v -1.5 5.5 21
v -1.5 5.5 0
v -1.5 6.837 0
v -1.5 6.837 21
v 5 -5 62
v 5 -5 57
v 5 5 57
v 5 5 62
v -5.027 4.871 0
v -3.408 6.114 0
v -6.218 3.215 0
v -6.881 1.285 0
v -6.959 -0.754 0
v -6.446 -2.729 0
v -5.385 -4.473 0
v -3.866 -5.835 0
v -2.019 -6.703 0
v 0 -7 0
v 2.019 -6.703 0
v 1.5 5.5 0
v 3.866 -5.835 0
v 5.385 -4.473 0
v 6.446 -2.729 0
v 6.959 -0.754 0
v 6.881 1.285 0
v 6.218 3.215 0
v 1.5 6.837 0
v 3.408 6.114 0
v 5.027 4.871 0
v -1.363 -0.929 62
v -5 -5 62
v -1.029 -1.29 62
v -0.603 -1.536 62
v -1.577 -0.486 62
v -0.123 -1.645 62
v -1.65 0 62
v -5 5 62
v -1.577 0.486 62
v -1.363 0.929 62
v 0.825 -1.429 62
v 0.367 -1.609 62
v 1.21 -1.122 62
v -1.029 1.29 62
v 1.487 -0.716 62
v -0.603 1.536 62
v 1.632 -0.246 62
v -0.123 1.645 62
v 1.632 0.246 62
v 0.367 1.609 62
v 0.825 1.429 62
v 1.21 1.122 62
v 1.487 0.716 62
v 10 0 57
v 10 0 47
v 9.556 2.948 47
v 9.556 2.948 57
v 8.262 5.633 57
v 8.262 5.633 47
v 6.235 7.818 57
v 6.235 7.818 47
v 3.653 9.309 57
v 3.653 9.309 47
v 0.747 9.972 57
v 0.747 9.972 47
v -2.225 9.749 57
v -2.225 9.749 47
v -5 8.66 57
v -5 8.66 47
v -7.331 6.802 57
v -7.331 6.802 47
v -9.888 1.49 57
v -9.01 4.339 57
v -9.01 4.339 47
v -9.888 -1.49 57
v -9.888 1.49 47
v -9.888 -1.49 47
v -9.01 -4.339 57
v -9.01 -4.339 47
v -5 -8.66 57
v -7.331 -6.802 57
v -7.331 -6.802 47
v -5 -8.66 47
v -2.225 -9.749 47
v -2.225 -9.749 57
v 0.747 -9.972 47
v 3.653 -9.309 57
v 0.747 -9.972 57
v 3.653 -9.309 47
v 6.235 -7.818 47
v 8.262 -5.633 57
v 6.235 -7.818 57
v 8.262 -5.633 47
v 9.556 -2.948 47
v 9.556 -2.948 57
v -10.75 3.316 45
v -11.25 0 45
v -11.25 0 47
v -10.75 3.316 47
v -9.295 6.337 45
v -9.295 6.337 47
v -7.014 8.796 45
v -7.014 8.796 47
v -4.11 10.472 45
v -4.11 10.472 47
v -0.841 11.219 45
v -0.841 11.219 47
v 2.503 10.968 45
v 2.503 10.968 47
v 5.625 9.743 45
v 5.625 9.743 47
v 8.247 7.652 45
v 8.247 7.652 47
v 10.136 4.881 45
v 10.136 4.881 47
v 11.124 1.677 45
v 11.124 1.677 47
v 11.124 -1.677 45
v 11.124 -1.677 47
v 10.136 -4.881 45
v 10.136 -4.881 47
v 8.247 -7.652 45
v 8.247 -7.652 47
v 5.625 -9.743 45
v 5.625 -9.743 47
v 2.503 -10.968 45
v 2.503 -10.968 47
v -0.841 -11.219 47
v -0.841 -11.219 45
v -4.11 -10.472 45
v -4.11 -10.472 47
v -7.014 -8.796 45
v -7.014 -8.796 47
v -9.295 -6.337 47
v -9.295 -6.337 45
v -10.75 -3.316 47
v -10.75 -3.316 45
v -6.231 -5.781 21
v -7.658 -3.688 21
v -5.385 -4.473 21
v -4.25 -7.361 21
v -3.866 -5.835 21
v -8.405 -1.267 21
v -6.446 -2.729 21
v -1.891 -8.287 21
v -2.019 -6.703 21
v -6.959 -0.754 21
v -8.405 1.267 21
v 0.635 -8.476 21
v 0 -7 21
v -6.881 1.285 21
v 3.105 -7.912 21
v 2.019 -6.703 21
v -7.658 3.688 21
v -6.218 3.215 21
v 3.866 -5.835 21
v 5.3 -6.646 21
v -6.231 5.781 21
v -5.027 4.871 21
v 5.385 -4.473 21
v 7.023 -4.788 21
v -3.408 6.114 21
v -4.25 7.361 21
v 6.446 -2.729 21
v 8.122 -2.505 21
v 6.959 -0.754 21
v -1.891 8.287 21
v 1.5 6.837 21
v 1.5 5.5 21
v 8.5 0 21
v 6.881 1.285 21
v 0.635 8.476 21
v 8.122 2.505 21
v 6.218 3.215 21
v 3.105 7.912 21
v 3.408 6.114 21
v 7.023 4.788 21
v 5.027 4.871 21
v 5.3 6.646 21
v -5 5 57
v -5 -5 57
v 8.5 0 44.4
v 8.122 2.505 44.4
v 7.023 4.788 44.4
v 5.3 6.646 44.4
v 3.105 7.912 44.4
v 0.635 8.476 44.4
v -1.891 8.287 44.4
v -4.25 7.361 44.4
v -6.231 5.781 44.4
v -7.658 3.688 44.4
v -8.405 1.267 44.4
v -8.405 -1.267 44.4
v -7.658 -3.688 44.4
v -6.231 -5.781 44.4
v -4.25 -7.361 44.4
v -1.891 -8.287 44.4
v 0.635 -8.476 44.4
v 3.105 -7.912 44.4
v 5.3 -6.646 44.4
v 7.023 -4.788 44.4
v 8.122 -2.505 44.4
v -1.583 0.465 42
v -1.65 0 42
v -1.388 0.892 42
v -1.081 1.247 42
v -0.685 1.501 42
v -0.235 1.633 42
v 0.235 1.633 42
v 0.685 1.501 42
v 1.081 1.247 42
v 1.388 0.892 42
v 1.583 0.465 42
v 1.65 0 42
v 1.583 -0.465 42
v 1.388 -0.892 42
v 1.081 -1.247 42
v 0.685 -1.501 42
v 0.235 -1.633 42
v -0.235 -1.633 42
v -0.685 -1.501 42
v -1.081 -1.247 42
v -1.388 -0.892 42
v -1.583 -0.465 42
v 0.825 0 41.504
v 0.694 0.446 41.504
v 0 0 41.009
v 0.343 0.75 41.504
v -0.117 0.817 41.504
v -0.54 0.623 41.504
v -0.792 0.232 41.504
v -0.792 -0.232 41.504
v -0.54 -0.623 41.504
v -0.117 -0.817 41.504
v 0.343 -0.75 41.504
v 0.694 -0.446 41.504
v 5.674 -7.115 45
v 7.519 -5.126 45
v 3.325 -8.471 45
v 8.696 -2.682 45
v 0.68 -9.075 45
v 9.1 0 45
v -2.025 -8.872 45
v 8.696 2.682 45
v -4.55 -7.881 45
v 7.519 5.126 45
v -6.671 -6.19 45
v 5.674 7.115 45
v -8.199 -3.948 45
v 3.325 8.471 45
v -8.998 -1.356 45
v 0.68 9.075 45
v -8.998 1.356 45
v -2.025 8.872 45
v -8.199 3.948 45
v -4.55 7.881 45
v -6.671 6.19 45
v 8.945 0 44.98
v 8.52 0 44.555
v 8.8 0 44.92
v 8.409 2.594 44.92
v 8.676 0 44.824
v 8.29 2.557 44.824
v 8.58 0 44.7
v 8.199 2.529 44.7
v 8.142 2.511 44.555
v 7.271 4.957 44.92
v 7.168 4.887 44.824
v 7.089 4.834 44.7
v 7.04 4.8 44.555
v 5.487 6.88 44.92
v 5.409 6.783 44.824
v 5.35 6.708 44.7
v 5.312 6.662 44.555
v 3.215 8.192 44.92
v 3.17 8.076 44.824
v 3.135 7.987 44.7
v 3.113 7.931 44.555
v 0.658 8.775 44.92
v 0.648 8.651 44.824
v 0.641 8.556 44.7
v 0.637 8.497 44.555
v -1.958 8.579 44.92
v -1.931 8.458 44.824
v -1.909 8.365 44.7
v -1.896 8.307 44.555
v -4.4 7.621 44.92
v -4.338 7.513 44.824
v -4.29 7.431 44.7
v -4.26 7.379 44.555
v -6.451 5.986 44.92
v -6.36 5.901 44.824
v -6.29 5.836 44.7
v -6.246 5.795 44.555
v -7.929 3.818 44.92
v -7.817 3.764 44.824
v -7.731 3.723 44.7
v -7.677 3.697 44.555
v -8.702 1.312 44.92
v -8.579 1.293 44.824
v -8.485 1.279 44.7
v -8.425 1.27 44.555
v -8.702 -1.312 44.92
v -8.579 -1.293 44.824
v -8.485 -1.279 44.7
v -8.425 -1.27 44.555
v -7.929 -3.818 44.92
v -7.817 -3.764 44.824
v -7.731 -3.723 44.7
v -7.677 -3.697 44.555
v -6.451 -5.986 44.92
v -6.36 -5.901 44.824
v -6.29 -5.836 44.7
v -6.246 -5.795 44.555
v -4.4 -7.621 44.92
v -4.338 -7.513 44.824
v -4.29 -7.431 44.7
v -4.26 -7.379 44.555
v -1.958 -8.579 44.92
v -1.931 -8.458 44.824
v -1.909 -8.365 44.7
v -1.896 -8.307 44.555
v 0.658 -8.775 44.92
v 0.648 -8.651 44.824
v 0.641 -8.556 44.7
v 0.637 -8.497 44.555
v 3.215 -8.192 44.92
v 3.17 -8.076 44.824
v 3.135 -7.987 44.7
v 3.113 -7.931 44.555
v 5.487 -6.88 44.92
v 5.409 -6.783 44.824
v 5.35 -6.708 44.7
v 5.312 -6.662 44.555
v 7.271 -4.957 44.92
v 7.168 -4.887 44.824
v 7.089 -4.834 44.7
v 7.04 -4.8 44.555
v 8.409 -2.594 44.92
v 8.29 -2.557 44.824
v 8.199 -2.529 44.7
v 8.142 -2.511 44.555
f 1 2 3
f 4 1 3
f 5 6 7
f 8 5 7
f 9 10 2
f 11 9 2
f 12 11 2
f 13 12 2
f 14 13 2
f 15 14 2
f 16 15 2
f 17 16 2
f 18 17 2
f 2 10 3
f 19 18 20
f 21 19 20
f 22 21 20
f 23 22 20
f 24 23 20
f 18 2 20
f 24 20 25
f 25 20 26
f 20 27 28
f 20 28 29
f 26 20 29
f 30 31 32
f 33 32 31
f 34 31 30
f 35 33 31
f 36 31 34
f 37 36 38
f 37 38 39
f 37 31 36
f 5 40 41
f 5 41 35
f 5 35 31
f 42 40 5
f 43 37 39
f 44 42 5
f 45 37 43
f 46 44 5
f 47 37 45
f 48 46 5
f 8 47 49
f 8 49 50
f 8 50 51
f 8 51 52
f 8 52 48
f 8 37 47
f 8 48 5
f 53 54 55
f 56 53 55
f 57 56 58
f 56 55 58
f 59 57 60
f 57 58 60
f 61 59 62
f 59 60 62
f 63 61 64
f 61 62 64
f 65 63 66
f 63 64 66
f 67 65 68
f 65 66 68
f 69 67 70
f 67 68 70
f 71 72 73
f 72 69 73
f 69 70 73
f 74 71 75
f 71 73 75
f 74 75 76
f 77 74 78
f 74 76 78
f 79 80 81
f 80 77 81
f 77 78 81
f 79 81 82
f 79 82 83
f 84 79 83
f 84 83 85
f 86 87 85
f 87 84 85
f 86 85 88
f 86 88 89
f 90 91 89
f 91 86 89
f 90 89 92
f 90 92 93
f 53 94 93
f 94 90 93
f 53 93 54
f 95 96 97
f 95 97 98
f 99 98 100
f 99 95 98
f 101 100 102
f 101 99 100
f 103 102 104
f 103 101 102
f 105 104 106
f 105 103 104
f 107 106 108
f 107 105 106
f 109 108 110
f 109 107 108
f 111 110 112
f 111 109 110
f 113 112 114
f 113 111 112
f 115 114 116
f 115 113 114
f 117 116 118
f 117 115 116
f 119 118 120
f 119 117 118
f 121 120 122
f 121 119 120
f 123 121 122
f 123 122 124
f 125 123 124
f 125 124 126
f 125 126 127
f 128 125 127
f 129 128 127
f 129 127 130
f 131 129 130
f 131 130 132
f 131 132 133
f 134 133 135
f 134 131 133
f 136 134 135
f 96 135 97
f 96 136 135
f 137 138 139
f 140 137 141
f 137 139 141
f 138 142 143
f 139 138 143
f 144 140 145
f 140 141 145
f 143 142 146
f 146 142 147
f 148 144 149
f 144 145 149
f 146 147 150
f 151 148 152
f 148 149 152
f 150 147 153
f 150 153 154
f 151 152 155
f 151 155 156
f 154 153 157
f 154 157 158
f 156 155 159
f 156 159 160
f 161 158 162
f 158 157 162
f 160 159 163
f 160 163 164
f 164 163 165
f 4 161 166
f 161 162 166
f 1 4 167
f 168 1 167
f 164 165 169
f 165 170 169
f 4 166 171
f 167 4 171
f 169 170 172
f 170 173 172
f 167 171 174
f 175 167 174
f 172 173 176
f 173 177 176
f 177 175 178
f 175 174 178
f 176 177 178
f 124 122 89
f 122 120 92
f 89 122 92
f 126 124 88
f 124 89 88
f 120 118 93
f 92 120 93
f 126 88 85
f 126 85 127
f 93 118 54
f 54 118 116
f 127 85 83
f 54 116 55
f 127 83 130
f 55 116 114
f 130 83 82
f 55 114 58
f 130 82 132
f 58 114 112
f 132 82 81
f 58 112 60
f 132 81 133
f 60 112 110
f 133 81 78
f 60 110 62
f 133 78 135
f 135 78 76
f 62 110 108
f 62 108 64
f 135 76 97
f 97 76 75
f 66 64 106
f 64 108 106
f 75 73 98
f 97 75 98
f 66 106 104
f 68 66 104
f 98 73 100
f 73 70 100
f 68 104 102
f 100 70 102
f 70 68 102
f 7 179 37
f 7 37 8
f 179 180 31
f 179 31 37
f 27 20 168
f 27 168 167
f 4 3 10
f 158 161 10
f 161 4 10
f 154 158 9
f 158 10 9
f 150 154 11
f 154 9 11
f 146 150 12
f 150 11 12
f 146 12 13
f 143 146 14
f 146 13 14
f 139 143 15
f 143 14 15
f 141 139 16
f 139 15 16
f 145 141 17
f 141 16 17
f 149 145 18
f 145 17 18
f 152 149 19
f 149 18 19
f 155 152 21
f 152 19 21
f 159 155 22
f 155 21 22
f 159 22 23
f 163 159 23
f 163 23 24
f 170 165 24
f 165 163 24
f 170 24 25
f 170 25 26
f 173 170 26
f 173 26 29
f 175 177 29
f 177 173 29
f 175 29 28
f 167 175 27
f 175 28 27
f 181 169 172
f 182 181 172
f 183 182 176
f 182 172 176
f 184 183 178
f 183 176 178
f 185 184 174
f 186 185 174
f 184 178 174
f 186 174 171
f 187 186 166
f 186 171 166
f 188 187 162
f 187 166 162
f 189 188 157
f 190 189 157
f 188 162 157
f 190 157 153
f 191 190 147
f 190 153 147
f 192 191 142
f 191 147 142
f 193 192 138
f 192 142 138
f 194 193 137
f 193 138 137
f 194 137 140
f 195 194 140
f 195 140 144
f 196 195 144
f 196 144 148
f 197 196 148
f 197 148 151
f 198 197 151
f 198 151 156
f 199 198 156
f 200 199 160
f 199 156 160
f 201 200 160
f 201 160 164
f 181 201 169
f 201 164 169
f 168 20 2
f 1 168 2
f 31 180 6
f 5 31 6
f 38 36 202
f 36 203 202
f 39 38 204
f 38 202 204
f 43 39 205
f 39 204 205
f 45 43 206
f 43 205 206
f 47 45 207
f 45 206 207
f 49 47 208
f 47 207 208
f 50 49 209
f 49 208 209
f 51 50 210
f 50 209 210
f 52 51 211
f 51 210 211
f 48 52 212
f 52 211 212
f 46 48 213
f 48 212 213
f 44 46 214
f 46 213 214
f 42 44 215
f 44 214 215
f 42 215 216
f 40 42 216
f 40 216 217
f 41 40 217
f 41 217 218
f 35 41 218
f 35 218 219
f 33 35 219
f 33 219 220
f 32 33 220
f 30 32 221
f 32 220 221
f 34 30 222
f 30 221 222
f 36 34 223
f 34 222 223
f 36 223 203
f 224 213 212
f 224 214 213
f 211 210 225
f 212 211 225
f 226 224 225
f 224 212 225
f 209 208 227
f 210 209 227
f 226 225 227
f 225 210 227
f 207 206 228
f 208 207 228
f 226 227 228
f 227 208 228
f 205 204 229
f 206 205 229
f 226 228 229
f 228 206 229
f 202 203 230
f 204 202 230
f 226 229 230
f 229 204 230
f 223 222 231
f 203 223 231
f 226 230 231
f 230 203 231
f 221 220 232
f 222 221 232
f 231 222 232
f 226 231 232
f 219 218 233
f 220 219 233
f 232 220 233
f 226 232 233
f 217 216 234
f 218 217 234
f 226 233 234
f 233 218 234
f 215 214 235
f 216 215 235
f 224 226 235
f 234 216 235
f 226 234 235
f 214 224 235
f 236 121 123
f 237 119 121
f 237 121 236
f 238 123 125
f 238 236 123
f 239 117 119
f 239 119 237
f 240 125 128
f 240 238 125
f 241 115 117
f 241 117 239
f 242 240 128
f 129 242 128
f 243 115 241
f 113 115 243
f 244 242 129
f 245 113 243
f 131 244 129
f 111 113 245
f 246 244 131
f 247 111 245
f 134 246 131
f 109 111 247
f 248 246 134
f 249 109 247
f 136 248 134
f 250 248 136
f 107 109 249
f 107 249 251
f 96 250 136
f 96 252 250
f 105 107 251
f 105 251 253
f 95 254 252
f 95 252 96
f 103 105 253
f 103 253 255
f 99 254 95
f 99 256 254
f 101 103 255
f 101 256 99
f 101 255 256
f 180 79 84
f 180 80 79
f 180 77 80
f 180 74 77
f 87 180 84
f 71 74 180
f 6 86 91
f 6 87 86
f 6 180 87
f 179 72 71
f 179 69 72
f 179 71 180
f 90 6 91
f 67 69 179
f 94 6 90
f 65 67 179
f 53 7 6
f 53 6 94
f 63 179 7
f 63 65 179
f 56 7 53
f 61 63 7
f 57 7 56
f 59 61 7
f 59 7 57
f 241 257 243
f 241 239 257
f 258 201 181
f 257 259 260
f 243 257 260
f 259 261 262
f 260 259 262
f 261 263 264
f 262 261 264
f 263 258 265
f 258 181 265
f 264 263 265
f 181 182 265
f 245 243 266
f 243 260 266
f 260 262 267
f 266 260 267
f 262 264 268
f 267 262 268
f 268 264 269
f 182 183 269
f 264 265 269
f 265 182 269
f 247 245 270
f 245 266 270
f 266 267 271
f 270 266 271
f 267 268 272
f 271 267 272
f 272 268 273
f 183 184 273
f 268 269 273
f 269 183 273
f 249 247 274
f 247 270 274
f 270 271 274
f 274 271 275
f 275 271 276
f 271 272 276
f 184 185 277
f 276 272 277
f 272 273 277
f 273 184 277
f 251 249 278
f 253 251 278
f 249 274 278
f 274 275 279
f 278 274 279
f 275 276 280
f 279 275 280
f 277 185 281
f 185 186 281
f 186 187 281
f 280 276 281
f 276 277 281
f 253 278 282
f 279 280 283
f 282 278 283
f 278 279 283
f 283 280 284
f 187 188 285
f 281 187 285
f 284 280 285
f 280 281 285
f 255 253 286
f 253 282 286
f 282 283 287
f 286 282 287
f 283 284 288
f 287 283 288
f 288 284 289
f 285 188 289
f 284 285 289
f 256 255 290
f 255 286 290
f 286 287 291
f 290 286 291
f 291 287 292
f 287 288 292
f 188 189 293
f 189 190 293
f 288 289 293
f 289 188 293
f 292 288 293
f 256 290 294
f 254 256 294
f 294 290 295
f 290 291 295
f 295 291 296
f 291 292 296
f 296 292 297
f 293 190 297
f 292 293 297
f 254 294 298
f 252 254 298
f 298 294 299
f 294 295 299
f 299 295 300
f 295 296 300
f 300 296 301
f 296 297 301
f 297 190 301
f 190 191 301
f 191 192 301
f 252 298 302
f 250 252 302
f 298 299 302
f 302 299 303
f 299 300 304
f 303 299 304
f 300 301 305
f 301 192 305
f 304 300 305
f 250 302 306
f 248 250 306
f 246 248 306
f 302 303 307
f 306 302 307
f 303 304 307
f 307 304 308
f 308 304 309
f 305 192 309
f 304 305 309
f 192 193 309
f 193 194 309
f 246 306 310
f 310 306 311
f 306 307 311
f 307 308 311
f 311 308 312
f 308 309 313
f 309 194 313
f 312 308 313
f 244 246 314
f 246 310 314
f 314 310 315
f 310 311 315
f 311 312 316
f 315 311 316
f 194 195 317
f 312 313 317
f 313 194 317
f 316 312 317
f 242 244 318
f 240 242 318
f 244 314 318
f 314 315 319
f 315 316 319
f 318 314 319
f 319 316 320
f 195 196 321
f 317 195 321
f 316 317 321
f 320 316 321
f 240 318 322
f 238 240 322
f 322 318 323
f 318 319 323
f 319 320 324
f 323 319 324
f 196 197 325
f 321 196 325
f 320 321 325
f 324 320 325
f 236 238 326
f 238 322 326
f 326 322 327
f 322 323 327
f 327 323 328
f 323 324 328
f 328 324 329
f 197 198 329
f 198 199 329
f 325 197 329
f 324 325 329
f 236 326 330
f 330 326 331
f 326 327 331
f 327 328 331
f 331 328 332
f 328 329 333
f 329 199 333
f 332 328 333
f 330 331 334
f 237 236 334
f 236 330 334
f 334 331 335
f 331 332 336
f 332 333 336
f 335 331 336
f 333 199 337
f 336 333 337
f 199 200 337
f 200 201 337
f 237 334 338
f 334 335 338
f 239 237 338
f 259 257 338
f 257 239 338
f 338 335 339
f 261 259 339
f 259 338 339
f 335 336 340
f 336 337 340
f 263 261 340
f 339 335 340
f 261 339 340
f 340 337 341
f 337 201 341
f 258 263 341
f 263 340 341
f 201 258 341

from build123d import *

# Parameters (mm, degrees)
SKETCH1_R                 = 7
BOSS_EXTRUDE1_DEPTH       = 21
SKETCH3_W                 = 3
SKETCH3_H                 = 3
CUT_EXTRUDE1_DEPTH        = 21
SKETCH6_R                 = 8.5
BOSS_EXTRUDE2_DEPTH       = 24
SKETCH7_R                 = 10
BOSS_EXTRUDE3_DEPTH       = 17
FILLET1_R                 = 0.6
SKETCH8_R                 = 11.25
BOSS_EXTRUDE4_DEPTH       = 2
SKETCH10_R                = 11
SKETCH10_W                = 10
SKETCH10_H                = 10
CUT_EXTRUDE2_DEPTH        = 5
M4X0_7_TAPPED_HOLE1_D     = 3.3
M4X0_7_TAPPED_HOLE1_DEPTH = 20
M4X0_7_TAPPED_HOLE1_TIP   = 0.991420021


with BuildPart() as part:
    # Sketch1 → Boss-Extrude1 (new body)
    with BuildSketch(Plane.XY):
        Circle(SKETCH1_R)
    extrude(amount=BOSS_EXTRUDE1_DEPTH)

    # Sketch3 → Cut-Extrude1 (cut)
    with BuildSketch(Plane(origin=(0, 0, 0), x_dir=(-1, 0, 0), z_dir=(0, 0, -1))):
        with Locations((0, 7)):
            Rectangle(SKETCH3_W, SKETCH3_H)
    extrude(amount=-CUT_EXTRUDE1_DEPTH, mode=Mode.SUBTRACT)

    # Sketch6 → Boss-Extrude2 (add)
    with BuildSketch(Plane.XY.offset(21)):
        Circle(SKETCH6_R)
    extrude(amount=BOSS_EXTRUDE2_DEPTH)

    # Sketch7 → Boss-Extrude3 (add)
    with BuildSketch(Plane.XY.offset(45)):
        Circle(SKETCH7_R)
    extrude(amount=BOSS_EXTRUDE3_DEPTH)

    # Fillet1
    fillet1_edges = [part.edges().sort_by_distance(p)[0] for p in [
        (-8.5, 0, 45),
    ]]
    fillet(fillet1_edges, radius=FILLET1_R)

    # Sketch8 → Boss-Extrude4 (add)
    with BuildSketch(Plane(origin=(0, 0, 45), x_dir=(-1, 0, 0), z_dir=(0, 0, -1))):
        Circle(SKETCH8_R)
    extrude(amount=-BOSS_EXTRUDE4_DEPTH)

    # Sketch10 → Cut-Extrude2 (cut)
    with BuildSketch(Plane.XY.offset(57)):
        Circle(SKETCH10_R)
        Rectangle(SKETCH10_W, SKETCH10_H, mode=Mode.SUBTRACT)
    extrude(amount=CUT_EXTRUDE2_DEPTH, mode=Mode.SUBTRACT)

    # M4x0.7 Tapped Hole1
    with Locations(Plane.XY.offset(62)):
        with Locations((0, 0)):
            Hole(M4X0_7_TAPPED_HOLE1_D / 2, depth=M4X0_7_TAPPED_HOLE1_DEPTH)
            with Locations((0, 0, -(M4X0_7_TAPPED_HOLE1_DEPTH + M4X0_7_TAPPED_HOLE1_TIP / 2))):  # 118° drill point
                Cone(0, M4X0_7_TAPPED_HOLE1_D / 2, M4X0_7_TAPPED_HOLE1_TIP, mode=Mode.SUBTRACT)


solid = part.part
